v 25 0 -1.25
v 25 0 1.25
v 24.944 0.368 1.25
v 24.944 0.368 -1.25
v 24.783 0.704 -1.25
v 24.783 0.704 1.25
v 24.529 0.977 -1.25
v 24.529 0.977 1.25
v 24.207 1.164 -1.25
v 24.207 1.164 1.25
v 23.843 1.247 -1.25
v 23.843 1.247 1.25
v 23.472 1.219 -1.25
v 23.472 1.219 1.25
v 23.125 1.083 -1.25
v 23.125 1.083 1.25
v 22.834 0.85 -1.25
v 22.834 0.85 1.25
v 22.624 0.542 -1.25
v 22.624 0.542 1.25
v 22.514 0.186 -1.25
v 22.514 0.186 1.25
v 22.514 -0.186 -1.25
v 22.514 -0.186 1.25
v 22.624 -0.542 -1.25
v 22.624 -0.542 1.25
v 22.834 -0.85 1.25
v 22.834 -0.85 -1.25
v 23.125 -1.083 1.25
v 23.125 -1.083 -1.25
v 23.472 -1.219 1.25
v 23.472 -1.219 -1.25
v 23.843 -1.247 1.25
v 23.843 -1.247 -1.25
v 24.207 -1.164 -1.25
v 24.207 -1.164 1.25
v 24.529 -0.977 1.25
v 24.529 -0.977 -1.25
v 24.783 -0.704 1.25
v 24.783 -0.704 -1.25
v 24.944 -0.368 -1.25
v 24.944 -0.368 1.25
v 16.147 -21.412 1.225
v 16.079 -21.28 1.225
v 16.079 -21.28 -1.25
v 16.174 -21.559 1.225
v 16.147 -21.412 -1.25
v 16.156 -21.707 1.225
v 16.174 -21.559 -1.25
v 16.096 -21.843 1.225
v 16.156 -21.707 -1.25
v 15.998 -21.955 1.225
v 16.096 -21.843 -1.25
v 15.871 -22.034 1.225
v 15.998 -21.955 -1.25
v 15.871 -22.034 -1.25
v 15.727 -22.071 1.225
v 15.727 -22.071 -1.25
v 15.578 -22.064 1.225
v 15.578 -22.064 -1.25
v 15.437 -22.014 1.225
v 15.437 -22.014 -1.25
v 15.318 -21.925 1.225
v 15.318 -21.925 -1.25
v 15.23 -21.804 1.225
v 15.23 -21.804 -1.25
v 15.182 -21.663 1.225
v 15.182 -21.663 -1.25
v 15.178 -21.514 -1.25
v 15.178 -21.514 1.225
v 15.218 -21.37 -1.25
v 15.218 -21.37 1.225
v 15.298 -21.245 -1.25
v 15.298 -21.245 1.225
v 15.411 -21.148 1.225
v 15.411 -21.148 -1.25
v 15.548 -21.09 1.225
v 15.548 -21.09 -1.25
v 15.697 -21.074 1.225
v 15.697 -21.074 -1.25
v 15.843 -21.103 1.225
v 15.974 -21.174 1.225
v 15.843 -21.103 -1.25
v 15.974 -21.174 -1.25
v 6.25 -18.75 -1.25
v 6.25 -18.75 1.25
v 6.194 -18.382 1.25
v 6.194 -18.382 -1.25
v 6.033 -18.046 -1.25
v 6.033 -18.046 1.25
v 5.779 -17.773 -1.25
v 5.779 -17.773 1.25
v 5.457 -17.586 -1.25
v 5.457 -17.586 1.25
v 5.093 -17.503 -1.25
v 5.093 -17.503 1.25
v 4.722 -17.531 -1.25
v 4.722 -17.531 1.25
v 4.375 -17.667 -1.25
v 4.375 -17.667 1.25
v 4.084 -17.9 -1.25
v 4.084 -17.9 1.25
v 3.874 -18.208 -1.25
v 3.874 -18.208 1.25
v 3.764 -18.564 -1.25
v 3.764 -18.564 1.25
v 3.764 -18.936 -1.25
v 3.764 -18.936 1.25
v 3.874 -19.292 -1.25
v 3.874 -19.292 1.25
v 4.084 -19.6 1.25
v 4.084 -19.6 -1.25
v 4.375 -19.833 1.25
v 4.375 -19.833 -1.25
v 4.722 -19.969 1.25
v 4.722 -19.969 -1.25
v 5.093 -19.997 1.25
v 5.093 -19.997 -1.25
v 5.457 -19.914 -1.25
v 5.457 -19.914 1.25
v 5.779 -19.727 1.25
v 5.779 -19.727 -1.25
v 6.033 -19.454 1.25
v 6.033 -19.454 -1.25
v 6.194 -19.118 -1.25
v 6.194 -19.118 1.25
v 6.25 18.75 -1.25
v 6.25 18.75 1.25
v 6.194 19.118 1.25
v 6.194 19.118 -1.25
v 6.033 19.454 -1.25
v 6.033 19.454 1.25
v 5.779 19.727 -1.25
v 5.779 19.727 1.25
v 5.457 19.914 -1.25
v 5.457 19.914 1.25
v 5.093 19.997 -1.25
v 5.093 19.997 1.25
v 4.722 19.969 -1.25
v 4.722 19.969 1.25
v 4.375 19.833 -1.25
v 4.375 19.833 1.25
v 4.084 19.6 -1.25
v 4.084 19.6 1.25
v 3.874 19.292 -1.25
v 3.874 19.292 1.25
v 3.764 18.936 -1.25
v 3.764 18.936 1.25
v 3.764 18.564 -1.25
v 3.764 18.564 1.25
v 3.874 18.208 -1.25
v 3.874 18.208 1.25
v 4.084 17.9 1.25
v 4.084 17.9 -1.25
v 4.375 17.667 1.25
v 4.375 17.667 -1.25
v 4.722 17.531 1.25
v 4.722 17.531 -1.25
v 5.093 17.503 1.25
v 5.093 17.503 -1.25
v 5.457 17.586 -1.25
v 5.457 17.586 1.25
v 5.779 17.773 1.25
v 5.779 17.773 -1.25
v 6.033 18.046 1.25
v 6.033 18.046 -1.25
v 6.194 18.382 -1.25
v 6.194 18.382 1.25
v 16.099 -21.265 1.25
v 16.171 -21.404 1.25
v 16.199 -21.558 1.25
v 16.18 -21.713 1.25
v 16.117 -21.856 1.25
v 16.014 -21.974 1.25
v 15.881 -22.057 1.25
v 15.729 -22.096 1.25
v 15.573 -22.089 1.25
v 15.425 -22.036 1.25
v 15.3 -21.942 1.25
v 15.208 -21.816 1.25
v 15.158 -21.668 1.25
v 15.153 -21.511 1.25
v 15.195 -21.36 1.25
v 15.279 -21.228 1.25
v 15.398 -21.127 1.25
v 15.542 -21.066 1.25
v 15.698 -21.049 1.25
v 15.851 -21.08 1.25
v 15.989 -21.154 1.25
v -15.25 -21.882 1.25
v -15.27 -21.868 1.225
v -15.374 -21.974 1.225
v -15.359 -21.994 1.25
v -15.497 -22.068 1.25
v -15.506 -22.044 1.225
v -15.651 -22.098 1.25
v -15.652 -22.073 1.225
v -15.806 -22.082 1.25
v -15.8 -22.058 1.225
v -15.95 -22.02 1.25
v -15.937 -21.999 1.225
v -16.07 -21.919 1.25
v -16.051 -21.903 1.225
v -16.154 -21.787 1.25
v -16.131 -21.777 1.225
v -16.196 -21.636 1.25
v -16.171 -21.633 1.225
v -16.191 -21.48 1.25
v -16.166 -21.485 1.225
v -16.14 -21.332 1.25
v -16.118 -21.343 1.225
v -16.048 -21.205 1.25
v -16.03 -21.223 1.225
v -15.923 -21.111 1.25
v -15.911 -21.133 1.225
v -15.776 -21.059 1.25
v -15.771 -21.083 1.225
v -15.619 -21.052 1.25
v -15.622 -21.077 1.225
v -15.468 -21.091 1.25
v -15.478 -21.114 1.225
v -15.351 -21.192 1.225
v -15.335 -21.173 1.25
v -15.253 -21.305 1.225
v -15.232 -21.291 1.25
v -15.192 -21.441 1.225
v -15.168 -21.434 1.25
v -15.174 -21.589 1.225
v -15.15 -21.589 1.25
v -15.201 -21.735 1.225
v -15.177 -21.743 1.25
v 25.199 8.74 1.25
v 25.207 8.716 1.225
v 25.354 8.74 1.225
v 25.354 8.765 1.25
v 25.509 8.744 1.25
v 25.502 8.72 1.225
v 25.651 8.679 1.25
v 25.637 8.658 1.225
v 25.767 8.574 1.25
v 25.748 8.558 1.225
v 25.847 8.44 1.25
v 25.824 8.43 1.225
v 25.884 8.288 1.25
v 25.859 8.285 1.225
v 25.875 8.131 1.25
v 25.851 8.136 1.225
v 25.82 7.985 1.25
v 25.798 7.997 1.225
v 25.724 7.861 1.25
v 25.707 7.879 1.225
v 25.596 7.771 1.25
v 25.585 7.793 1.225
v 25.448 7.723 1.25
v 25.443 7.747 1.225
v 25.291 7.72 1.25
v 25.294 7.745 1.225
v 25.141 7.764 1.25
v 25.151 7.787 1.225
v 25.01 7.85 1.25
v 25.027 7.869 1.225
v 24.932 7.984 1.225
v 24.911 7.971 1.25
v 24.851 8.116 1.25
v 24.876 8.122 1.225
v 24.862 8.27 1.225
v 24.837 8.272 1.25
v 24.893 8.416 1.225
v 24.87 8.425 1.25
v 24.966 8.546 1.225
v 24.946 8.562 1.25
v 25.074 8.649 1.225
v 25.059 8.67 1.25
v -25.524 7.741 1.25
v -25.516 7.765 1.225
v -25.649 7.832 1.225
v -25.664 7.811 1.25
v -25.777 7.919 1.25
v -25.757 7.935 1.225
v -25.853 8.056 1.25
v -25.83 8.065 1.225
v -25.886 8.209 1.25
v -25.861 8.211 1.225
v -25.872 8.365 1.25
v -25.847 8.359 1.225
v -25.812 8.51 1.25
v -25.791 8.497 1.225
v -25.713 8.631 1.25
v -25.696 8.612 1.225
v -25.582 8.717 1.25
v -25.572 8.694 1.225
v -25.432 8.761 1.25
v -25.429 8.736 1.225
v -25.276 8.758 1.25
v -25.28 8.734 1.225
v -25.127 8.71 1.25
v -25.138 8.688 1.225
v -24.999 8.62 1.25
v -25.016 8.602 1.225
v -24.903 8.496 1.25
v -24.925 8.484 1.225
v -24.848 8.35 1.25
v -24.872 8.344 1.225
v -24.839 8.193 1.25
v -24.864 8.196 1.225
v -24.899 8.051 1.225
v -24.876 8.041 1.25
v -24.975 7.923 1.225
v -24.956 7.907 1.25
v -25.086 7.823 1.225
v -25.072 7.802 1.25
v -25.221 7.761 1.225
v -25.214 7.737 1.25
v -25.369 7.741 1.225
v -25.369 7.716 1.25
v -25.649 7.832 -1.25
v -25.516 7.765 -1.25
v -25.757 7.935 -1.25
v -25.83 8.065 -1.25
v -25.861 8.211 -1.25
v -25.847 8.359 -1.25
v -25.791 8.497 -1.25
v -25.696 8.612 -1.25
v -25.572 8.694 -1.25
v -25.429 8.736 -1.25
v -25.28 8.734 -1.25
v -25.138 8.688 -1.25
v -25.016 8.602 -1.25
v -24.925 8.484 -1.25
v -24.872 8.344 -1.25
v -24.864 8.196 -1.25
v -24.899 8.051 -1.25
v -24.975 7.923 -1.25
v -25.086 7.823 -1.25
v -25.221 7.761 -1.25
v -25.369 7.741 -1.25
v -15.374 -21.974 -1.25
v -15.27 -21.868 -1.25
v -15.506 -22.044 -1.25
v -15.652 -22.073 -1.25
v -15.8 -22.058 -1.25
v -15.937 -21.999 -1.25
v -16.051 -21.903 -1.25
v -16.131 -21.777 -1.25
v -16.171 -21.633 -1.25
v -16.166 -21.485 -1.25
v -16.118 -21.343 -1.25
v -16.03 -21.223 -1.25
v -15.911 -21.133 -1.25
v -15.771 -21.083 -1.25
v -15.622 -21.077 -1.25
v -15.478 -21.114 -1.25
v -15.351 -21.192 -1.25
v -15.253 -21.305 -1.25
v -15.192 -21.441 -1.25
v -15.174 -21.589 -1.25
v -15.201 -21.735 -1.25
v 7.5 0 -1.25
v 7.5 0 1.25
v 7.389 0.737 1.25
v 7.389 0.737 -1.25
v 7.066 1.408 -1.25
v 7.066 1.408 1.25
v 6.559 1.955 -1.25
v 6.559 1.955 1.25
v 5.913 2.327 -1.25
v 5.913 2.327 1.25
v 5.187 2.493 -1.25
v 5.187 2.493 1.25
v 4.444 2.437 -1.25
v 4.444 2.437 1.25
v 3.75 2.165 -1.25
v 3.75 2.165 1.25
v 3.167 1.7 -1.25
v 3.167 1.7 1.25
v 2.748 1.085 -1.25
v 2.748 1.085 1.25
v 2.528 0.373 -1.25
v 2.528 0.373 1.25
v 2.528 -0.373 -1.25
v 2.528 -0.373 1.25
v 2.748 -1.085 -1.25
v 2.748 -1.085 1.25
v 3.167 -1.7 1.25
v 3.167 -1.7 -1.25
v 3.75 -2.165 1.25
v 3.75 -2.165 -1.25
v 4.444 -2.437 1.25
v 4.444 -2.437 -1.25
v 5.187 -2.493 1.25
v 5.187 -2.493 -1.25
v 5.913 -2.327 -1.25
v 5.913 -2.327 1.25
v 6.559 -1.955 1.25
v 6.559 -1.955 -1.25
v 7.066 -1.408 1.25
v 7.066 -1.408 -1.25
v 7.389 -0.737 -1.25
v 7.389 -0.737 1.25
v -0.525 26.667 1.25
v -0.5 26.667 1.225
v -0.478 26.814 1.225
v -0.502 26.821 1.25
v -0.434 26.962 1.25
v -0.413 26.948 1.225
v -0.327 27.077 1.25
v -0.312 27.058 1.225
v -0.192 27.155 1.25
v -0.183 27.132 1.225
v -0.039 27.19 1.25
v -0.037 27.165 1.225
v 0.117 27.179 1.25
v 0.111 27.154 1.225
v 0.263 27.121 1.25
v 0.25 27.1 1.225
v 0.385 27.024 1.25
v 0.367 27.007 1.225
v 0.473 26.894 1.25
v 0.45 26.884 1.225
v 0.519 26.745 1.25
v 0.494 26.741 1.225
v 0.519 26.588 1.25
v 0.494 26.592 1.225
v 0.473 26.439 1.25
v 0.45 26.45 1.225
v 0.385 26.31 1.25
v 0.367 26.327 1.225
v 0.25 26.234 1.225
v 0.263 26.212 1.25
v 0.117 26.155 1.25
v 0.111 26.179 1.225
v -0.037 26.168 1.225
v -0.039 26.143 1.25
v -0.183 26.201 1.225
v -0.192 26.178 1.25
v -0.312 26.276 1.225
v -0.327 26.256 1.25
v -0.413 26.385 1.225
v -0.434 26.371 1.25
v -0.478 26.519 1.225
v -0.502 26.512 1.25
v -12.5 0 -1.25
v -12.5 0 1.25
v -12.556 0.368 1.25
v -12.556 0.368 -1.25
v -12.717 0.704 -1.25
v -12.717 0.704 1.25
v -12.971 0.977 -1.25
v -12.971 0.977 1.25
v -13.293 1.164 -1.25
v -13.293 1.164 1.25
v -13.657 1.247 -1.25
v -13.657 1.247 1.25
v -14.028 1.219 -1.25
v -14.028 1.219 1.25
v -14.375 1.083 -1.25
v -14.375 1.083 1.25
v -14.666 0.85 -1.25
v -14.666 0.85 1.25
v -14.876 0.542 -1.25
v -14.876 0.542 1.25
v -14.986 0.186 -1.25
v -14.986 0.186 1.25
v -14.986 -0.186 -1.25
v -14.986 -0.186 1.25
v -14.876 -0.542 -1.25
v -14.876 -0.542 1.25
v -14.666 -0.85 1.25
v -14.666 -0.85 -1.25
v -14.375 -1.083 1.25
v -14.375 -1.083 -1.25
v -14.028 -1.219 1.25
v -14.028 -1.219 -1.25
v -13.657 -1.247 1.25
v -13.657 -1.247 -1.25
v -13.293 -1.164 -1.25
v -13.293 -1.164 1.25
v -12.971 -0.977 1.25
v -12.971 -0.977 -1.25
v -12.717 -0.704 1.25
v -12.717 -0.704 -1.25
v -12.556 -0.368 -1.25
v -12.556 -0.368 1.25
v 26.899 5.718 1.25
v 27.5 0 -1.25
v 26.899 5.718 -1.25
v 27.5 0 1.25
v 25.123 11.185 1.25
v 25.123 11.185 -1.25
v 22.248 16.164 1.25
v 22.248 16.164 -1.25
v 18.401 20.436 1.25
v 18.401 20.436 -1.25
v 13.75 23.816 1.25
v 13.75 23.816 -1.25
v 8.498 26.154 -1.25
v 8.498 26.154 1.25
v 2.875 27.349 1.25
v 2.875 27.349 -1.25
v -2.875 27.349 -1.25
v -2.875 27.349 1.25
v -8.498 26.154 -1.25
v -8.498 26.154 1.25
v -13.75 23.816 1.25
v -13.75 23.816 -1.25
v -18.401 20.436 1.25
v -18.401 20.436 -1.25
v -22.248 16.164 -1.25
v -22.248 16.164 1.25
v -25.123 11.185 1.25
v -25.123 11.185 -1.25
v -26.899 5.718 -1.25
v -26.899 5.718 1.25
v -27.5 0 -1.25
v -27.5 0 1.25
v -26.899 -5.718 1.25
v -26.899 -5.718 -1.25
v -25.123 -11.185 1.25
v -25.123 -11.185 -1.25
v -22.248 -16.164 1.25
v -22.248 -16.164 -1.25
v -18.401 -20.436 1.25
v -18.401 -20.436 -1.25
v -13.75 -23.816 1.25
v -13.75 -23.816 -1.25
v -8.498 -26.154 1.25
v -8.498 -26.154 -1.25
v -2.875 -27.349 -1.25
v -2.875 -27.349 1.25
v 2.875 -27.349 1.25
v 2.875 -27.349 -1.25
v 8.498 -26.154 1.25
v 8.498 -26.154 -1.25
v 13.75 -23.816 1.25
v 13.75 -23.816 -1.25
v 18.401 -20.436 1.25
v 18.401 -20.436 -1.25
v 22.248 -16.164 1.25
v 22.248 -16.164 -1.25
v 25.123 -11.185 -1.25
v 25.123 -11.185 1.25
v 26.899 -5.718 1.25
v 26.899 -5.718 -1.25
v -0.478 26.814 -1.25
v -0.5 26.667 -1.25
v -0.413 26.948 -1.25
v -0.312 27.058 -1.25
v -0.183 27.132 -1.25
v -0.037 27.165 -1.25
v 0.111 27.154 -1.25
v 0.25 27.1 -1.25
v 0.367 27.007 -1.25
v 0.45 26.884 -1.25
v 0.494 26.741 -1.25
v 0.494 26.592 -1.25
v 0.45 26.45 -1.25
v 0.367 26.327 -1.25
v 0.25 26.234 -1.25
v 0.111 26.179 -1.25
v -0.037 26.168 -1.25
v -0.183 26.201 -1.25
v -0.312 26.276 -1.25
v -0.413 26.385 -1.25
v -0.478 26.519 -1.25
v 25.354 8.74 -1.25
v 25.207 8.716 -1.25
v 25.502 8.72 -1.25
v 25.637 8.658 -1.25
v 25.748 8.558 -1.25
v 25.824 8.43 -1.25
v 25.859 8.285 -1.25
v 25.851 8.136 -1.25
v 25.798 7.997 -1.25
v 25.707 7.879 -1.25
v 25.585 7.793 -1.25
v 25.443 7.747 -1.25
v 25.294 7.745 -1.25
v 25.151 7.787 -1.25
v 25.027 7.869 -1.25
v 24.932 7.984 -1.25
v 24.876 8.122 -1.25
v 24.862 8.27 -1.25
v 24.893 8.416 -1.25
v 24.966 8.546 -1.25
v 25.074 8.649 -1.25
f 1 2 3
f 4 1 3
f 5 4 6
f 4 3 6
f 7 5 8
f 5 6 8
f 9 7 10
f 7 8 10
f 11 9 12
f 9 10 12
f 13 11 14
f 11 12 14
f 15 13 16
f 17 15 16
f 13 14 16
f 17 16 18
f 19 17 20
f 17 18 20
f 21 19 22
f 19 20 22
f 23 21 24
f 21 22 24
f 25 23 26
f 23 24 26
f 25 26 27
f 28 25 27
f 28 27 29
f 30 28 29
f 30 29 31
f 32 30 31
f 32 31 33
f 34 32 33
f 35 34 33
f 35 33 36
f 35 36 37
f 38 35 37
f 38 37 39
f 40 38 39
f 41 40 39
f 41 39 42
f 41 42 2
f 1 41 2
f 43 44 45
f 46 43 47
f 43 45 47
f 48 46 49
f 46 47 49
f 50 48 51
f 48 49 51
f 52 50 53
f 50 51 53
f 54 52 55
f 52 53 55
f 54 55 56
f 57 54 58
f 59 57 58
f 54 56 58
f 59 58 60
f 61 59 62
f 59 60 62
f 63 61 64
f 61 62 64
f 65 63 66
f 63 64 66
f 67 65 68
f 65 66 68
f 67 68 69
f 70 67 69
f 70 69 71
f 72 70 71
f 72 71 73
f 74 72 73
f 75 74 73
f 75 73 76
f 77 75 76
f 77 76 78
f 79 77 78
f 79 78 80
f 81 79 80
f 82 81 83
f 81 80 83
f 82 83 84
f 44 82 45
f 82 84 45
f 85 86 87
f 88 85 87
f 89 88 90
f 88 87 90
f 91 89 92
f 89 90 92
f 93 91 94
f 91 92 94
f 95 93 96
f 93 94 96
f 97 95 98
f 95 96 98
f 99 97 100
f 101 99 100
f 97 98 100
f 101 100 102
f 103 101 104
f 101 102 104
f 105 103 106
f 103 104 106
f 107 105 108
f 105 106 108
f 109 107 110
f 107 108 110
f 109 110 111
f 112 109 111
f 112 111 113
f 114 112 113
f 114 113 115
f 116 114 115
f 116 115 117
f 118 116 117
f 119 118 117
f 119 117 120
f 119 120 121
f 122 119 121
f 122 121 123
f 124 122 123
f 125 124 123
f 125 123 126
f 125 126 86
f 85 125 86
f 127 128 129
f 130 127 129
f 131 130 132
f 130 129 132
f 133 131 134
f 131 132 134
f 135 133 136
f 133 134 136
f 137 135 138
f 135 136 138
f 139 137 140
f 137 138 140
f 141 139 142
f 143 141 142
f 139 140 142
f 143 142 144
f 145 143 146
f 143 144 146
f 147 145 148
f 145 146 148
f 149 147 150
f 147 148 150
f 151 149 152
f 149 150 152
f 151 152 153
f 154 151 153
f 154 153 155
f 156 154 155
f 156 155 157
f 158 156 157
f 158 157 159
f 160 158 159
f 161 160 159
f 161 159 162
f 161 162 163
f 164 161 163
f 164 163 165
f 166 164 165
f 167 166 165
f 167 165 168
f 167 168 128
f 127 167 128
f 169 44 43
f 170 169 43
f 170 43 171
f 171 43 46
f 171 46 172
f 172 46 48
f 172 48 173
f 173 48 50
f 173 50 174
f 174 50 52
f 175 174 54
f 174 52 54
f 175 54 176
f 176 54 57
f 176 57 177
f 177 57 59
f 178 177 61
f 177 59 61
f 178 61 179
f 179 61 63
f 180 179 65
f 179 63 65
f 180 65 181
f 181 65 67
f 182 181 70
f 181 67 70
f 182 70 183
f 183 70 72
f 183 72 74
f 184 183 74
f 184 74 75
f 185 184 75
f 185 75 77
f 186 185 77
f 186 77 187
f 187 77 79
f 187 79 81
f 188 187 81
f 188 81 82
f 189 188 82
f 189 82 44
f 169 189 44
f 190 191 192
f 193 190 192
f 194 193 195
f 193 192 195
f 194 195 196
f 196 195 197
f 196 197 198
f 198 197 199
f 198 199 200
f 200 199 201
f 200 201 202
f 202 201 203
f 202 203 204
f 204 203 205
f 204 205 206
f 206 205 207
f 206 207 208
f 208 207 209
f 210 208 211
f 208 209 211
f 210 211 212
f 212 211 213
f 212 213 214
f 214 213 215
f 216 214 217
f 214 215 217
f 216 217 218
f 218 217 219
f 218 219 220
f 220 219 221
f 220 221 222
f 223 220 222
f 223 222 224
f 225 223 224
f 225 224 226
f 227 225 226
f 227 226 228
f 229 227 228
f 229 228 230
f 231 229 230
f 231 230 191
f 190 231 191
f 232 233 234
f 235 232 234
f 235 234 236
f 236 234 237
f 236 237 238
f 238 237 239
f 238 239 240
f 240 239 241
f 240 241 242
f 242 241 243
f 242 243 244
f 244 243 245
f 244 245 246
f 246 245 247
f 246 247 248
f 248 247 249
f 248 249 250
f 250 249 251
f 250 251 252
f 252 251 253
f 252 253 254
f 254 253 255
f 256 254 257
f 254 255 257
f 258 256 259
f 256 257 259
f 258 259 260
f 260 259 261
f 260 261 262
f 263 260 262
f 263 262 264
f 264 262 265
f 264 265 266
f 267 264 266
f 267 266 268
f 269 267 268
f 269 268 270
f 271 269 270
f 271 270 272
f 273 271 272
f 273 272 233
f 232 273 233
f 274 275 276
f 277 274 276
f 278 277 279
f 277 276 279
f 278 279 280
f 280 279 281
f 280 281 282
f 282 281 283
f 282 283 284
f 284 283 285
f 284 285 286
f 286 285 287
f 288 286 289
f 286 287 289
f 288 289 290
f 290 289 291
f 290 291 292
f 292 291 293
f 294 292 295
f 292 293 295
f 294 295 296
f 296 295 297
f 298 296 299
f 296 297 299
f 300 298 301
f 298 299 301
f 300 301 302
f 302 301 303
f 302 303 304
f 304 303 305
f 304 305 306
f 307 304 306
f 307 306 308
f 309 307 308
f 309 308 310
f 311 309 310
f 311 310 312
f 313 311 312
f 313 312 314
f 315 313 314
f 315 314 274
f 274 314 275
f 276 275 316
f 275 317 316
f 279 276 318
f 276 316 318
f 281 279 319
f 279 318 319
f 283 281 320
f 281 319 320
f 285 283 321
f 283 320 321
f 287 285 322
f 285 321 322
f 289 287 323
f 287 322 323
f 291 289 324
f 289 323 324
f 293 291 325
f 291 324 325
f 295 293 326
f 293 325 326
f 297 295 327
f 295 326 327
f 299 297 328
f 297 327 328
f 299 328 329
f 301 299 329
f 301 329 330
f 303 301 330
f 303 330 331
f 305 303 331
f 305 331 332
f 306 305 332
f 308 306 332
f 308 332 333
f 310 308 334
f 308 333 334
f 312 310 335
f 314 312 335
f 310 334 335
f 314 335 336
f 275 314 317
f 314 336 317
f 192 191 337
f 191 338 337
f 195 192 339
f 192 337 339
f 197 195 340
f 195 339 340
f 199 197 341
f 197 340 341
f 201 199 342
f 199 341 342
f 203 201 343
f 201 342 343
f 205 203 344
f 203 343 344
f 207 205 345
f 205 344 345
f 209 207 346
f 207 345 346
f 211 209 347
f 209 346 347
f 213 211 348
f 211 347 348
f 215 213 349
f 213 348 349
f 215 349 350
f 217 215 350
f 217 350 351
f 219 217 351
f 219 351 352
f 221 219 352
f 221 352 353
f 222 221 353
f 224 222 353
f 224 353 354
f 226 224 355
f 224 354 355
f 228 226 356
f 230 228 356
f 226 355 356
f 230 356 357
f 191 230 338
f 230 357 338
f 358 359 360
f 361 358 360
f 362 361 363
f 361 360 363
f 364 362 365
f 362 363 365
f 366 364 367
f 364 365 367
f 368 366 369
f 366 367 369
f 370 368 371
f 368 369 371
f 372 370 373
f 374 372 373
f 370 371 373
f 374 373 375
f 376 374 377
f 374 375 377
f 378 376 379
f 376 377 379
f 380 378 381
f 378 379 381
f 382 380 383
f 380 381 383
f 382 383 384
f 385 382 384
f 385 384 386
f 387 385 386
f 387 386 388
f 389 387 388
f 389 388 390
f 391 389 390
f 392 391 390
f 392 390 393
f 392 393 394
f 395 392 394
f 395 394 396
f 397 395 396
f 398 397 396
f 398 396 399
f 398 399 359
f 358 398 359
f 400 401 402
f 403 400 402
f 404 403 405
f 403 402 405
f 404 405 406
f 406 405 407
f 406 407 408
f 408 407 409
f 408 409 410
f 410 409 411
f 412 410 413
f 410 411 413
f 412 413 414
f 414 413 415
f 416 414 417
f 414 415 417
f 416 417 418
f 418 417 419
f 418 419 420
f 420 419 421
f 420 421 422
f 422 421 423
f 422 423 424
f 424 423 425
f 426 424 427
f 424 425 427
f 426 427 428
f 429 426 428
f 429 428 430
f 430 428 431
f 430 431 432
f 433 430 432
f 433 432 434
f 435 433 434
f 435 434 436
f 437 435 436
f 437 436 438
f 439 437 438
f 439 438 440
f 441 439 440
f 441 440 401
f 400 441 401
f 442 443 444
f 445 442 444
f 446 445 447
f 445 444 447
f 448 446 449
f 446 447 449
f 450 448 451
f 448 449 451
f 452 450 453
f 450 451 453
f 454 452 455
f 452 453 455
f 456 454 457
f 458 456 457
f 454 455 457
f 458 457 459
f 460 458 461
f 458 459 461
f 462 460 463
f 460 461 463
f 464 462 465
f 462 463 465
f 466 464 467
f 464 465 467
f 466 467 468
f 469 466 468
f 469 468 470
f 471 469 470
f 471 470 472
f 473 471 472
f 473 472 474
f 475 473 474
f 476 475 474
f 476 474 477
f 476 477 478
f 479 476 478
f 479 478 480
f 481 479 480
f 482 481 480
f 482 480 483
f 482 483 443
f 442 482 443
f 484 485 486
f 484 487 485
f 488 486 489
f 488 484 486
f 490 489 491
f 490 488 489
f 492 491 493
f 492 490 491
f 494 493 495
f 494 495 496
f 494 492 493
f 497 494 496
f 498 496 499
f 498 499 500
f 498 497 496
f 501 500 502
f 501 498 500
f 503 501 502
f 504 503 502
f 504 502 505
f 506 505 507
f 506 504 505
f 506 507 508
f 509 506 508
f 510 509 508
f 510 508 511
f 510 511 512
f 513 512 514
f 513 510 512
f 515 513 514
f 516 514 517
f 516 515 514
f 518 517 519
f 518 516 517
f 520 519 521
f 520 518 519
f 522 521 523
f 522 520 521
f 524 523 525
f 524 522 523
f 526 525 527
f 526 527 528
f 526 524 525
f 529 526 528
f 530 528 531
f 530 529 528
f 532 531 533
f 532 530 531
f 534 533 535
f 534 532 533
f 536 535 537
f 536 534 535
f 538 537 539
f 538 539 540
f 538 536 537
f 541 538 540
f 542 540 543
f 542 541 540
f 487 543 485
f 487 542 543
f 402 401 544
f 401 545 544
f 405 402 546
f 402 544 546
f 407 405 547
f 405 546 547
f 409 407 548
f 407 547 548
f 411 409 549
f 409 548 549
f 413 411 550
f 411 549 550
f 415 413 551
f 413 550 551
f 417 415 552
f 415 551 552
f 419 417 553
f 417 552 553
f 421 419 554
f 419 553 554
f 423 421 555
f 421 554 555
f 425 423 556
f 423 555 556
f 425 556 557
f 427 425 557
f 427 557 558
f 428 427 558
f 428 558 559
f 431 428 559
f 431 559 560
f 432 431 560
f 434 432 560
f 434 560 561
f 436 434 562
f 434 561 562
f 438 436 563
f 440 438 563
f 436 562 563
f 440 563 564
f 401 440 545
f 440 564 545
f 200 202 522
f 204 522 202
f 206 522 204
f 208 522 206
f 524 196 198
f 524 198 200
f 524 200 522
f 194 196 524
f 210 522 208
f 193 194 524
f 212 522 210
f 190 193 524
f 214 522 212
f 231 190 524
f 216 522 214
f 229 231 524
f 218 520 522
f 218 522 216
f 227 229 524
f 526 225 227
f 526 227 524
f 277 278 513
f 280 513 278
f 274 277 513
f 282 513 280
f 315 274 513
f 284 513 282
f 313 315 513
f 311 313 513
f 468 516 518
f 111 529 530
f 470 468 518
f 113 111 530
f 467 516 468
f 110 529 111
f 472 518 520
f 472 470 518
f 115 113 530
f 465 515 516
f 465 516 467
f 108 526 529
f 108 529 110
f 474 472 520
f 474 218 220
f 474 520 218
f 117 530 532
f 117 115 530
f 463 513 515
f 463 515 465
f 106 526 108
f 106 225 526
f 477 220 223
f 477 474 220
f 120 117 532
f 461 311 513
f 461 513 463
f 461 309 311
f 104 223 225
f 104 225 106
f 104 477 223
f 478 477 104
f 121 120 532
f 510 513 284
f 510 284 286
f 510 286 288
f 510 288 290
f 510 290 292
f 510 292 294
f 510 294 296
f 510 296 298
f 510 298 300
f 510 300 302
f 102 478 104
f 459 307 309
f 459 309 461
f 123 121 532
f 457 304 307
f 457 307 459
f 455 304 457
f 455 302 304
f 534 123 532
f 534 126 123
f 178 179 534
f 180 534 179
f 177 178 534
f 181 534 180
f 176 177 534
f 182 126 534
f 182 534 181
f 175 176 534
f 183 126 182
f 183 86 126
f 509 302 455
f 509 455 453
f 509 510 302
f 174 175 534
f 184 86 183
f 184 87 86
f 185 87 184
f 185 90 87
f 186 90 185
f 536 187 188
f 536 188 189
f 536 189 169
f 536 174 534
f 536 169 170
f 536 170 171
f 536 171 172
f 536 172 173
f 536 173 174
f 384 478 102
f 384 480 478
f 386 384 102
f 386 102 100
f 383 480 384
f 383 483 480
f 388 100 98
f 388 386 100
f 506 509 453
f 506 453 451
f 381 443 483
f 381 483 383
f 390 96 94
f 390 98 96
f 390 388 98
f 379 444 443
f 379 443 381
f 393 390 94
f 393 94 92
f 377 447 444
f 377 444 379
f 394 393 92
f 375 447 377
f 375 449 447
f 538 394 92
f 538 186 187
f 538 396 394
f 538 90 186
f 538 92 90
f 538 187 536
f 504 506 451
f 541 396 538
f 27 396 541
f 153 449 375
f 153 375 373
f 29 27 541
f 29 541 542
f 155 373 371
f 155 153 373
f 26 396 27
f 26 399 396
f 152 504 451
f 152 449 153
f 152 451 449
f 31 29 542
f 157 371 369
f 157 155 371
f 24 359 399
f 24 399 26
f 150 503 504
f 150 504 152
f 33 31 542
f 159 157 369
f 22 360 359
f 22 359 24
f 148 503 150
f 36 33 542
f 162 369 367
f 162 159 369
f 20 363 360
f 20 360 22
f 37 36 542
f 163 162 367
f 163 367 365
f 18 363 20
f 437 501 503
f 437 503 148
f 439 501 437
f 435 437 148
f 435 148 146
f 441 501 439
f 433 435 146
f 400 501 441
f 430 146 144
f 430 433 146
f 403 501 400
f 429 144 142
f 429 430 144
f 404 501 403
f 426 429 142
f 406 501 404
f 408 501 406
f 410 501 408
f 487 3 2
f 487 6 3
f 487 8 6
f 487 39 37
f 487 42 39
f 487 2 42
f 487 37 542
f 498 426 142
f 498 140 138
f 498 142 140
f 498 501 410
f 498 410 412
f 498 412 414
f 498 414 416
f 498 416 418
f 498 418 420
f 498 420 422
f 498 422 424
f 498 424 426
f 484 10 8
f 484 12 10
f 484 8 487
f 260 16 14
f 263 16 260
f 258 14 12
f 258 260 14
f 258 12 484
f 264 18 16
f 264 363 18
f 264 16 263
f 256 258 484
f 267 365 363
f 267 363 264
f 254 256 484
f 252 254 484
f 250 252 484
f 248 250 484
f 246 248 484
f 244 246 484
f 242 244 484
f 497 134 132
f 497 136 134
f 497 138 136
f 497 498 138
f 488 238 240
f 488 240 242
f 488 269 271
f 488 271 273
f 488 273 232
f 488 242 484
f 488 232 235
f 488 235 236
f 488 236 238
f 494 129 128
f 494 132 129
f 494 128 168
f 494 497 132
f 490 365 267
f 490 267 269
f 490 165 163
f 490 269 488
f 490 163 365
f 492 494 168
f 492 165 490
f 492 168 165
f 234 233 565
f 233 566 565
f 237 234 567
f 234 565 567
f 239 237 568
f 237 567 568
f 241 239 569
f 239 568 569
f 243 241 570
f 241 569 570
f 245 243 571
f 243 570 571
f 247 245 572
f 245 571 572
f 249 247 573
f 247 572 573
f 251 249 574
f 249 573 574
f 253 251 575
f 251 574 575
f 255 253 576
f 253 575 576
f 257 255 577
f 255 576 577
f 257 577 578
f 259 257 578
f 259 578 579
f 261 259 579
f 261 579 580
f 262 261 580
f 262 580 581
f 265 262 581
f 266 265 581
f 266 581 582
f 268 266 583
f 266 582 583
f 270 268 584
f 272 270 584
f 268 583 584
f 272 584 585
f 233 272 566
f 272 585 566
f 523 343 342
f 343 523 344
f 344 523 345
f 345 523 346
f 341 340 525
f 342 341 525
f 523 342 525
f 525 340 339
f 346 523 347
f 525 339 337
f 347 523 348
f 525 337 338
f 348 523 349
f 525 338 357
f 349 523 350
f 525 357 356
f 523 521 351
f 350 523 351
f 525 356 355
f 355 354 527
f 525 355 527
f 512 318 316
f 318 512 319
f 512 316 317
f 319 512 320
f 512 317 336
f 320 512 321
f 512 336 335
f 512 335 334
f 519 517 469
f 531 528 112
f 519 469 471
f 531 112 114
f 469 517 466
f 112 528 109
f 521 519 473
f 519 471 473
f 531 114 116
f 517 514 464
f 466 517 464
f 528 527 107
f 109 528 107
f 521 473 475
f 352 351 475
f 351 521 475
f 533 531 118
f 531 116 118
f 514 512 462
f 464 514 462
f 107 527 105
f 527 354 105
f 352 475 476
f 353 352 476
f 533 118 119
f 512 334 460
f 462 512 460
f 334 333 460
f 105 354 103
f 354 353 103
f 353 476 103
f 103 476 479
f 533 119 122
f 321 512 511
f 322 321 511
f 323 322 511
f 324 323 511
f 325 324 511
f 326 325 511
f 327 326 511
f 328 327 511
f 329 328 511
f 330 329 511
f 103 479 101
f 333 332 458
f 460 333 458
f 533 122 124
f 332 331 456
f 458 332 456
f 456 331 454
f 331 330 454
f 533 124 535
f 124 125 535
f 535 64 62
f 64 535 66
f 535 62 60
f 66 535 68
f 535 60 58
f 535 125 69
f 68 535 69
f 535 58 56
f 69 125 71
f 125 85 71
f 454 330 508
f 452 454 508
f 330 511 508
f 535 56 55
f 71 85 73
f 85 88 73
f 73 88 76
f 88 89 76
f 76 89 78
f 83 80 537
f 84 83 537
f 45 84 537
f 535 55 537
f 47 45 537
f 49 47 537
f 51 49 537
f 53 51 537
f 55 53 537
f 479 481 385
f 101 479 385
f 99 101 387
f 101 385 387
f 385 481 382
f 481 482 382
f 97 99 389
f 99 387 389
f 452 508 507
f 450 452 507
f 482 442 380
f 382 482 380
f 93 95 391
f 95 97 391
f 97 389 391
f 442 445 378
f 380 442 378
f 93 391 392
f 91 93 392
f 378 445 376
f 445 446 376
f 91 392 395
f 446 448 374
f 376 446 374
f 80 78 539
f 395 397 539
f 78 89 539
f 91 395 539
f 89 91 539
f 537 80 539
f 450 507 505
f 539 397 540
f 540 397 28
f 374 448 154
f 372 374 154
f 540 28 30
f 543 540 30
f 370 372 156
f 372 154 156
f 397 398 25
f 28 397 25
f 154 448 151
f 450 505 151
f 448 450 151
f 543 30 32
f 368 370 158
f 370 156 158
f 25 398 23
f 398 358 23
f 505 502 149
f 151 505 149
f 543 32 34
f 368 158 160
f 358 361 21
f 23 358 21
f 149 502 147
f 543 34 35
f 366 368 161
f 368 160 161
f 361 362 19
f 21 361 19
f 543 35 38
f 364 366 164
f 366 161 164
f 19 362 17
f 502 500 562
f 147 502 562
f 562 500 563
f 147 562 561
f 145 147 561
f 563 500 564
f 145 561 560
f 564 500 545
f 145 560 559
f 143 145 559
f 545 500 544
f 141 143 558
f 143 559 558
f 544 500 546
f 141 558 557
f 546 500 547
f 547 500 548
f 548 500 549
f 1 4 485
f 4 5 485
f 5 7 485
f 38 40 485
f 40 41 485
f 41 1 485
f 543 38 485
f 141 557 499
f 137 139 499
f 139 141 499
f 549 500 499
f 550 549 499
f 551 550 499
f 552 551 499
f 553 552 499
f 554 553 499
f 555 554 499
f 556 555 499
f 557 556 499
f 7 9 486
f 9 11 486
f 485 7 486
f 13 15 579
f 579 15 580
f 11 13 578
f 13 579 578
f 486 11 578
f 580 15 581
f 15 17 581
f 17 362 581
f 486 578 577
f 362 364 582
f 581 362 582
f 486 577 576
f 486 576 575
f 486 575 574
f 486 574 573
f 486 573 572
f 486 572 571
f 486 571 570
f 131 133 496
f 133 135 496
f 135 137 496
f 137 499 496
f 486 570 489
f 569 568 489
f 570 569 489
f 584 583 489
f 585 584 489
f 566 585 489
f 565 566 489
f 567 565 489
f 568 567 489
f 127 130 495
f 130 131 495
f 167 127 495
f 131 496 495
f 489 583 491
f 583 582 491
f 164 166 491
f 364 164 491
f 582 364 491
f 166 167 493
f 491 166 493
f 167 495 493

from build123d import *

# Parameters (mm, degrees)
SKETCH1_R                       = 27.5
BOSS_EXTRUDE1_DEPTH             = 1.25
SKETCH3_R                       = 2.5
SKETCH3_R_2                     = 1.25
CUT_EXTRUDE1_DEPTH              = 1
CUT_EXTRUDE1_DEPTH_BACK         = 3.5
F_1_0MM_DOWEL_HOLE1_D           = 1
F_1_0MM_DOWEL_HOLE1_CSINK_D     = 1.05
F_1_0MM_DOWEL_HOLE1_CSINK_ANGLE = 90
CIRPATTERN1_COUNT               = 5


with BuildPart() as part:
    # Sketch1 → Boss-Extrude1 (new body, symmetric)
    with BuildSketch(Plane.XY):
        Circle(SKETCH1_R)
    extrude(amount=BOSS_EXTRUDE1_DEPTH, both=True)

    # Sketch3 → Cut-Extrude1 (cut, two sides)
    with BuildSketch(Plane.XY.offset(1.25)) as cut_extrude1_sk:
        with Locations((5, 0)):
            Circle(SKETCH3_R)
        with Locations((5, 18.75)):
            Circle(SKETCH3_R_2)
        with Locations((-13.75, 0)):
            Circle(SKETCH3_R_2)
        with Locations((23.75, 0)):
            Circle(SKETCH3_R_2)
        with Locations((5, -18.75)):
            Circle(SKETCH3_R_2)
    extrude(amount=CUT_EXTRUDE1_DEPTH, mode=Mode.SUBTRACT)
    extrude(cut_extrude1_sk.sketch, amount=-CUT_EXTRUDE1_DEPTH_BACK, mode=Mode.SUBTRACT)

    # Ø1.0mm Dowel Hole1 (through all)
    with Locations(Plane(origin=(0, 26.666666667, 1.25), x_dir=(1, 0, 0), z_dir=(0, 0, 1))):
        with Locations((0, 0)):
            f_1_0mm_dowel_hole1 = CounterSinkHole(F_1_0MM_DOWEL_HOLE1_D / 2, F_1_0MM_DOWEL_HOLE1_CSINK_D / 2, counter_sink_angle=F_1_0MM_DOWEL_HOLE1_CSINK_ANGLE)

    # CirPattern1: Ø1.0mm Dowel Hole1 ×5 about axis
    cirpattern1_axis = Axis((0, 0, 0), (0, 0, 1))
    for i in range(1, CIRPATTERN1_COUNT):
        add(f_1_0mm_dowel_hole1.rotate(cirpattern1_axis, i * 360 / CIRPATTERN1_COUNT), mode=Mode.SUBTRACT)


solid = part.part
